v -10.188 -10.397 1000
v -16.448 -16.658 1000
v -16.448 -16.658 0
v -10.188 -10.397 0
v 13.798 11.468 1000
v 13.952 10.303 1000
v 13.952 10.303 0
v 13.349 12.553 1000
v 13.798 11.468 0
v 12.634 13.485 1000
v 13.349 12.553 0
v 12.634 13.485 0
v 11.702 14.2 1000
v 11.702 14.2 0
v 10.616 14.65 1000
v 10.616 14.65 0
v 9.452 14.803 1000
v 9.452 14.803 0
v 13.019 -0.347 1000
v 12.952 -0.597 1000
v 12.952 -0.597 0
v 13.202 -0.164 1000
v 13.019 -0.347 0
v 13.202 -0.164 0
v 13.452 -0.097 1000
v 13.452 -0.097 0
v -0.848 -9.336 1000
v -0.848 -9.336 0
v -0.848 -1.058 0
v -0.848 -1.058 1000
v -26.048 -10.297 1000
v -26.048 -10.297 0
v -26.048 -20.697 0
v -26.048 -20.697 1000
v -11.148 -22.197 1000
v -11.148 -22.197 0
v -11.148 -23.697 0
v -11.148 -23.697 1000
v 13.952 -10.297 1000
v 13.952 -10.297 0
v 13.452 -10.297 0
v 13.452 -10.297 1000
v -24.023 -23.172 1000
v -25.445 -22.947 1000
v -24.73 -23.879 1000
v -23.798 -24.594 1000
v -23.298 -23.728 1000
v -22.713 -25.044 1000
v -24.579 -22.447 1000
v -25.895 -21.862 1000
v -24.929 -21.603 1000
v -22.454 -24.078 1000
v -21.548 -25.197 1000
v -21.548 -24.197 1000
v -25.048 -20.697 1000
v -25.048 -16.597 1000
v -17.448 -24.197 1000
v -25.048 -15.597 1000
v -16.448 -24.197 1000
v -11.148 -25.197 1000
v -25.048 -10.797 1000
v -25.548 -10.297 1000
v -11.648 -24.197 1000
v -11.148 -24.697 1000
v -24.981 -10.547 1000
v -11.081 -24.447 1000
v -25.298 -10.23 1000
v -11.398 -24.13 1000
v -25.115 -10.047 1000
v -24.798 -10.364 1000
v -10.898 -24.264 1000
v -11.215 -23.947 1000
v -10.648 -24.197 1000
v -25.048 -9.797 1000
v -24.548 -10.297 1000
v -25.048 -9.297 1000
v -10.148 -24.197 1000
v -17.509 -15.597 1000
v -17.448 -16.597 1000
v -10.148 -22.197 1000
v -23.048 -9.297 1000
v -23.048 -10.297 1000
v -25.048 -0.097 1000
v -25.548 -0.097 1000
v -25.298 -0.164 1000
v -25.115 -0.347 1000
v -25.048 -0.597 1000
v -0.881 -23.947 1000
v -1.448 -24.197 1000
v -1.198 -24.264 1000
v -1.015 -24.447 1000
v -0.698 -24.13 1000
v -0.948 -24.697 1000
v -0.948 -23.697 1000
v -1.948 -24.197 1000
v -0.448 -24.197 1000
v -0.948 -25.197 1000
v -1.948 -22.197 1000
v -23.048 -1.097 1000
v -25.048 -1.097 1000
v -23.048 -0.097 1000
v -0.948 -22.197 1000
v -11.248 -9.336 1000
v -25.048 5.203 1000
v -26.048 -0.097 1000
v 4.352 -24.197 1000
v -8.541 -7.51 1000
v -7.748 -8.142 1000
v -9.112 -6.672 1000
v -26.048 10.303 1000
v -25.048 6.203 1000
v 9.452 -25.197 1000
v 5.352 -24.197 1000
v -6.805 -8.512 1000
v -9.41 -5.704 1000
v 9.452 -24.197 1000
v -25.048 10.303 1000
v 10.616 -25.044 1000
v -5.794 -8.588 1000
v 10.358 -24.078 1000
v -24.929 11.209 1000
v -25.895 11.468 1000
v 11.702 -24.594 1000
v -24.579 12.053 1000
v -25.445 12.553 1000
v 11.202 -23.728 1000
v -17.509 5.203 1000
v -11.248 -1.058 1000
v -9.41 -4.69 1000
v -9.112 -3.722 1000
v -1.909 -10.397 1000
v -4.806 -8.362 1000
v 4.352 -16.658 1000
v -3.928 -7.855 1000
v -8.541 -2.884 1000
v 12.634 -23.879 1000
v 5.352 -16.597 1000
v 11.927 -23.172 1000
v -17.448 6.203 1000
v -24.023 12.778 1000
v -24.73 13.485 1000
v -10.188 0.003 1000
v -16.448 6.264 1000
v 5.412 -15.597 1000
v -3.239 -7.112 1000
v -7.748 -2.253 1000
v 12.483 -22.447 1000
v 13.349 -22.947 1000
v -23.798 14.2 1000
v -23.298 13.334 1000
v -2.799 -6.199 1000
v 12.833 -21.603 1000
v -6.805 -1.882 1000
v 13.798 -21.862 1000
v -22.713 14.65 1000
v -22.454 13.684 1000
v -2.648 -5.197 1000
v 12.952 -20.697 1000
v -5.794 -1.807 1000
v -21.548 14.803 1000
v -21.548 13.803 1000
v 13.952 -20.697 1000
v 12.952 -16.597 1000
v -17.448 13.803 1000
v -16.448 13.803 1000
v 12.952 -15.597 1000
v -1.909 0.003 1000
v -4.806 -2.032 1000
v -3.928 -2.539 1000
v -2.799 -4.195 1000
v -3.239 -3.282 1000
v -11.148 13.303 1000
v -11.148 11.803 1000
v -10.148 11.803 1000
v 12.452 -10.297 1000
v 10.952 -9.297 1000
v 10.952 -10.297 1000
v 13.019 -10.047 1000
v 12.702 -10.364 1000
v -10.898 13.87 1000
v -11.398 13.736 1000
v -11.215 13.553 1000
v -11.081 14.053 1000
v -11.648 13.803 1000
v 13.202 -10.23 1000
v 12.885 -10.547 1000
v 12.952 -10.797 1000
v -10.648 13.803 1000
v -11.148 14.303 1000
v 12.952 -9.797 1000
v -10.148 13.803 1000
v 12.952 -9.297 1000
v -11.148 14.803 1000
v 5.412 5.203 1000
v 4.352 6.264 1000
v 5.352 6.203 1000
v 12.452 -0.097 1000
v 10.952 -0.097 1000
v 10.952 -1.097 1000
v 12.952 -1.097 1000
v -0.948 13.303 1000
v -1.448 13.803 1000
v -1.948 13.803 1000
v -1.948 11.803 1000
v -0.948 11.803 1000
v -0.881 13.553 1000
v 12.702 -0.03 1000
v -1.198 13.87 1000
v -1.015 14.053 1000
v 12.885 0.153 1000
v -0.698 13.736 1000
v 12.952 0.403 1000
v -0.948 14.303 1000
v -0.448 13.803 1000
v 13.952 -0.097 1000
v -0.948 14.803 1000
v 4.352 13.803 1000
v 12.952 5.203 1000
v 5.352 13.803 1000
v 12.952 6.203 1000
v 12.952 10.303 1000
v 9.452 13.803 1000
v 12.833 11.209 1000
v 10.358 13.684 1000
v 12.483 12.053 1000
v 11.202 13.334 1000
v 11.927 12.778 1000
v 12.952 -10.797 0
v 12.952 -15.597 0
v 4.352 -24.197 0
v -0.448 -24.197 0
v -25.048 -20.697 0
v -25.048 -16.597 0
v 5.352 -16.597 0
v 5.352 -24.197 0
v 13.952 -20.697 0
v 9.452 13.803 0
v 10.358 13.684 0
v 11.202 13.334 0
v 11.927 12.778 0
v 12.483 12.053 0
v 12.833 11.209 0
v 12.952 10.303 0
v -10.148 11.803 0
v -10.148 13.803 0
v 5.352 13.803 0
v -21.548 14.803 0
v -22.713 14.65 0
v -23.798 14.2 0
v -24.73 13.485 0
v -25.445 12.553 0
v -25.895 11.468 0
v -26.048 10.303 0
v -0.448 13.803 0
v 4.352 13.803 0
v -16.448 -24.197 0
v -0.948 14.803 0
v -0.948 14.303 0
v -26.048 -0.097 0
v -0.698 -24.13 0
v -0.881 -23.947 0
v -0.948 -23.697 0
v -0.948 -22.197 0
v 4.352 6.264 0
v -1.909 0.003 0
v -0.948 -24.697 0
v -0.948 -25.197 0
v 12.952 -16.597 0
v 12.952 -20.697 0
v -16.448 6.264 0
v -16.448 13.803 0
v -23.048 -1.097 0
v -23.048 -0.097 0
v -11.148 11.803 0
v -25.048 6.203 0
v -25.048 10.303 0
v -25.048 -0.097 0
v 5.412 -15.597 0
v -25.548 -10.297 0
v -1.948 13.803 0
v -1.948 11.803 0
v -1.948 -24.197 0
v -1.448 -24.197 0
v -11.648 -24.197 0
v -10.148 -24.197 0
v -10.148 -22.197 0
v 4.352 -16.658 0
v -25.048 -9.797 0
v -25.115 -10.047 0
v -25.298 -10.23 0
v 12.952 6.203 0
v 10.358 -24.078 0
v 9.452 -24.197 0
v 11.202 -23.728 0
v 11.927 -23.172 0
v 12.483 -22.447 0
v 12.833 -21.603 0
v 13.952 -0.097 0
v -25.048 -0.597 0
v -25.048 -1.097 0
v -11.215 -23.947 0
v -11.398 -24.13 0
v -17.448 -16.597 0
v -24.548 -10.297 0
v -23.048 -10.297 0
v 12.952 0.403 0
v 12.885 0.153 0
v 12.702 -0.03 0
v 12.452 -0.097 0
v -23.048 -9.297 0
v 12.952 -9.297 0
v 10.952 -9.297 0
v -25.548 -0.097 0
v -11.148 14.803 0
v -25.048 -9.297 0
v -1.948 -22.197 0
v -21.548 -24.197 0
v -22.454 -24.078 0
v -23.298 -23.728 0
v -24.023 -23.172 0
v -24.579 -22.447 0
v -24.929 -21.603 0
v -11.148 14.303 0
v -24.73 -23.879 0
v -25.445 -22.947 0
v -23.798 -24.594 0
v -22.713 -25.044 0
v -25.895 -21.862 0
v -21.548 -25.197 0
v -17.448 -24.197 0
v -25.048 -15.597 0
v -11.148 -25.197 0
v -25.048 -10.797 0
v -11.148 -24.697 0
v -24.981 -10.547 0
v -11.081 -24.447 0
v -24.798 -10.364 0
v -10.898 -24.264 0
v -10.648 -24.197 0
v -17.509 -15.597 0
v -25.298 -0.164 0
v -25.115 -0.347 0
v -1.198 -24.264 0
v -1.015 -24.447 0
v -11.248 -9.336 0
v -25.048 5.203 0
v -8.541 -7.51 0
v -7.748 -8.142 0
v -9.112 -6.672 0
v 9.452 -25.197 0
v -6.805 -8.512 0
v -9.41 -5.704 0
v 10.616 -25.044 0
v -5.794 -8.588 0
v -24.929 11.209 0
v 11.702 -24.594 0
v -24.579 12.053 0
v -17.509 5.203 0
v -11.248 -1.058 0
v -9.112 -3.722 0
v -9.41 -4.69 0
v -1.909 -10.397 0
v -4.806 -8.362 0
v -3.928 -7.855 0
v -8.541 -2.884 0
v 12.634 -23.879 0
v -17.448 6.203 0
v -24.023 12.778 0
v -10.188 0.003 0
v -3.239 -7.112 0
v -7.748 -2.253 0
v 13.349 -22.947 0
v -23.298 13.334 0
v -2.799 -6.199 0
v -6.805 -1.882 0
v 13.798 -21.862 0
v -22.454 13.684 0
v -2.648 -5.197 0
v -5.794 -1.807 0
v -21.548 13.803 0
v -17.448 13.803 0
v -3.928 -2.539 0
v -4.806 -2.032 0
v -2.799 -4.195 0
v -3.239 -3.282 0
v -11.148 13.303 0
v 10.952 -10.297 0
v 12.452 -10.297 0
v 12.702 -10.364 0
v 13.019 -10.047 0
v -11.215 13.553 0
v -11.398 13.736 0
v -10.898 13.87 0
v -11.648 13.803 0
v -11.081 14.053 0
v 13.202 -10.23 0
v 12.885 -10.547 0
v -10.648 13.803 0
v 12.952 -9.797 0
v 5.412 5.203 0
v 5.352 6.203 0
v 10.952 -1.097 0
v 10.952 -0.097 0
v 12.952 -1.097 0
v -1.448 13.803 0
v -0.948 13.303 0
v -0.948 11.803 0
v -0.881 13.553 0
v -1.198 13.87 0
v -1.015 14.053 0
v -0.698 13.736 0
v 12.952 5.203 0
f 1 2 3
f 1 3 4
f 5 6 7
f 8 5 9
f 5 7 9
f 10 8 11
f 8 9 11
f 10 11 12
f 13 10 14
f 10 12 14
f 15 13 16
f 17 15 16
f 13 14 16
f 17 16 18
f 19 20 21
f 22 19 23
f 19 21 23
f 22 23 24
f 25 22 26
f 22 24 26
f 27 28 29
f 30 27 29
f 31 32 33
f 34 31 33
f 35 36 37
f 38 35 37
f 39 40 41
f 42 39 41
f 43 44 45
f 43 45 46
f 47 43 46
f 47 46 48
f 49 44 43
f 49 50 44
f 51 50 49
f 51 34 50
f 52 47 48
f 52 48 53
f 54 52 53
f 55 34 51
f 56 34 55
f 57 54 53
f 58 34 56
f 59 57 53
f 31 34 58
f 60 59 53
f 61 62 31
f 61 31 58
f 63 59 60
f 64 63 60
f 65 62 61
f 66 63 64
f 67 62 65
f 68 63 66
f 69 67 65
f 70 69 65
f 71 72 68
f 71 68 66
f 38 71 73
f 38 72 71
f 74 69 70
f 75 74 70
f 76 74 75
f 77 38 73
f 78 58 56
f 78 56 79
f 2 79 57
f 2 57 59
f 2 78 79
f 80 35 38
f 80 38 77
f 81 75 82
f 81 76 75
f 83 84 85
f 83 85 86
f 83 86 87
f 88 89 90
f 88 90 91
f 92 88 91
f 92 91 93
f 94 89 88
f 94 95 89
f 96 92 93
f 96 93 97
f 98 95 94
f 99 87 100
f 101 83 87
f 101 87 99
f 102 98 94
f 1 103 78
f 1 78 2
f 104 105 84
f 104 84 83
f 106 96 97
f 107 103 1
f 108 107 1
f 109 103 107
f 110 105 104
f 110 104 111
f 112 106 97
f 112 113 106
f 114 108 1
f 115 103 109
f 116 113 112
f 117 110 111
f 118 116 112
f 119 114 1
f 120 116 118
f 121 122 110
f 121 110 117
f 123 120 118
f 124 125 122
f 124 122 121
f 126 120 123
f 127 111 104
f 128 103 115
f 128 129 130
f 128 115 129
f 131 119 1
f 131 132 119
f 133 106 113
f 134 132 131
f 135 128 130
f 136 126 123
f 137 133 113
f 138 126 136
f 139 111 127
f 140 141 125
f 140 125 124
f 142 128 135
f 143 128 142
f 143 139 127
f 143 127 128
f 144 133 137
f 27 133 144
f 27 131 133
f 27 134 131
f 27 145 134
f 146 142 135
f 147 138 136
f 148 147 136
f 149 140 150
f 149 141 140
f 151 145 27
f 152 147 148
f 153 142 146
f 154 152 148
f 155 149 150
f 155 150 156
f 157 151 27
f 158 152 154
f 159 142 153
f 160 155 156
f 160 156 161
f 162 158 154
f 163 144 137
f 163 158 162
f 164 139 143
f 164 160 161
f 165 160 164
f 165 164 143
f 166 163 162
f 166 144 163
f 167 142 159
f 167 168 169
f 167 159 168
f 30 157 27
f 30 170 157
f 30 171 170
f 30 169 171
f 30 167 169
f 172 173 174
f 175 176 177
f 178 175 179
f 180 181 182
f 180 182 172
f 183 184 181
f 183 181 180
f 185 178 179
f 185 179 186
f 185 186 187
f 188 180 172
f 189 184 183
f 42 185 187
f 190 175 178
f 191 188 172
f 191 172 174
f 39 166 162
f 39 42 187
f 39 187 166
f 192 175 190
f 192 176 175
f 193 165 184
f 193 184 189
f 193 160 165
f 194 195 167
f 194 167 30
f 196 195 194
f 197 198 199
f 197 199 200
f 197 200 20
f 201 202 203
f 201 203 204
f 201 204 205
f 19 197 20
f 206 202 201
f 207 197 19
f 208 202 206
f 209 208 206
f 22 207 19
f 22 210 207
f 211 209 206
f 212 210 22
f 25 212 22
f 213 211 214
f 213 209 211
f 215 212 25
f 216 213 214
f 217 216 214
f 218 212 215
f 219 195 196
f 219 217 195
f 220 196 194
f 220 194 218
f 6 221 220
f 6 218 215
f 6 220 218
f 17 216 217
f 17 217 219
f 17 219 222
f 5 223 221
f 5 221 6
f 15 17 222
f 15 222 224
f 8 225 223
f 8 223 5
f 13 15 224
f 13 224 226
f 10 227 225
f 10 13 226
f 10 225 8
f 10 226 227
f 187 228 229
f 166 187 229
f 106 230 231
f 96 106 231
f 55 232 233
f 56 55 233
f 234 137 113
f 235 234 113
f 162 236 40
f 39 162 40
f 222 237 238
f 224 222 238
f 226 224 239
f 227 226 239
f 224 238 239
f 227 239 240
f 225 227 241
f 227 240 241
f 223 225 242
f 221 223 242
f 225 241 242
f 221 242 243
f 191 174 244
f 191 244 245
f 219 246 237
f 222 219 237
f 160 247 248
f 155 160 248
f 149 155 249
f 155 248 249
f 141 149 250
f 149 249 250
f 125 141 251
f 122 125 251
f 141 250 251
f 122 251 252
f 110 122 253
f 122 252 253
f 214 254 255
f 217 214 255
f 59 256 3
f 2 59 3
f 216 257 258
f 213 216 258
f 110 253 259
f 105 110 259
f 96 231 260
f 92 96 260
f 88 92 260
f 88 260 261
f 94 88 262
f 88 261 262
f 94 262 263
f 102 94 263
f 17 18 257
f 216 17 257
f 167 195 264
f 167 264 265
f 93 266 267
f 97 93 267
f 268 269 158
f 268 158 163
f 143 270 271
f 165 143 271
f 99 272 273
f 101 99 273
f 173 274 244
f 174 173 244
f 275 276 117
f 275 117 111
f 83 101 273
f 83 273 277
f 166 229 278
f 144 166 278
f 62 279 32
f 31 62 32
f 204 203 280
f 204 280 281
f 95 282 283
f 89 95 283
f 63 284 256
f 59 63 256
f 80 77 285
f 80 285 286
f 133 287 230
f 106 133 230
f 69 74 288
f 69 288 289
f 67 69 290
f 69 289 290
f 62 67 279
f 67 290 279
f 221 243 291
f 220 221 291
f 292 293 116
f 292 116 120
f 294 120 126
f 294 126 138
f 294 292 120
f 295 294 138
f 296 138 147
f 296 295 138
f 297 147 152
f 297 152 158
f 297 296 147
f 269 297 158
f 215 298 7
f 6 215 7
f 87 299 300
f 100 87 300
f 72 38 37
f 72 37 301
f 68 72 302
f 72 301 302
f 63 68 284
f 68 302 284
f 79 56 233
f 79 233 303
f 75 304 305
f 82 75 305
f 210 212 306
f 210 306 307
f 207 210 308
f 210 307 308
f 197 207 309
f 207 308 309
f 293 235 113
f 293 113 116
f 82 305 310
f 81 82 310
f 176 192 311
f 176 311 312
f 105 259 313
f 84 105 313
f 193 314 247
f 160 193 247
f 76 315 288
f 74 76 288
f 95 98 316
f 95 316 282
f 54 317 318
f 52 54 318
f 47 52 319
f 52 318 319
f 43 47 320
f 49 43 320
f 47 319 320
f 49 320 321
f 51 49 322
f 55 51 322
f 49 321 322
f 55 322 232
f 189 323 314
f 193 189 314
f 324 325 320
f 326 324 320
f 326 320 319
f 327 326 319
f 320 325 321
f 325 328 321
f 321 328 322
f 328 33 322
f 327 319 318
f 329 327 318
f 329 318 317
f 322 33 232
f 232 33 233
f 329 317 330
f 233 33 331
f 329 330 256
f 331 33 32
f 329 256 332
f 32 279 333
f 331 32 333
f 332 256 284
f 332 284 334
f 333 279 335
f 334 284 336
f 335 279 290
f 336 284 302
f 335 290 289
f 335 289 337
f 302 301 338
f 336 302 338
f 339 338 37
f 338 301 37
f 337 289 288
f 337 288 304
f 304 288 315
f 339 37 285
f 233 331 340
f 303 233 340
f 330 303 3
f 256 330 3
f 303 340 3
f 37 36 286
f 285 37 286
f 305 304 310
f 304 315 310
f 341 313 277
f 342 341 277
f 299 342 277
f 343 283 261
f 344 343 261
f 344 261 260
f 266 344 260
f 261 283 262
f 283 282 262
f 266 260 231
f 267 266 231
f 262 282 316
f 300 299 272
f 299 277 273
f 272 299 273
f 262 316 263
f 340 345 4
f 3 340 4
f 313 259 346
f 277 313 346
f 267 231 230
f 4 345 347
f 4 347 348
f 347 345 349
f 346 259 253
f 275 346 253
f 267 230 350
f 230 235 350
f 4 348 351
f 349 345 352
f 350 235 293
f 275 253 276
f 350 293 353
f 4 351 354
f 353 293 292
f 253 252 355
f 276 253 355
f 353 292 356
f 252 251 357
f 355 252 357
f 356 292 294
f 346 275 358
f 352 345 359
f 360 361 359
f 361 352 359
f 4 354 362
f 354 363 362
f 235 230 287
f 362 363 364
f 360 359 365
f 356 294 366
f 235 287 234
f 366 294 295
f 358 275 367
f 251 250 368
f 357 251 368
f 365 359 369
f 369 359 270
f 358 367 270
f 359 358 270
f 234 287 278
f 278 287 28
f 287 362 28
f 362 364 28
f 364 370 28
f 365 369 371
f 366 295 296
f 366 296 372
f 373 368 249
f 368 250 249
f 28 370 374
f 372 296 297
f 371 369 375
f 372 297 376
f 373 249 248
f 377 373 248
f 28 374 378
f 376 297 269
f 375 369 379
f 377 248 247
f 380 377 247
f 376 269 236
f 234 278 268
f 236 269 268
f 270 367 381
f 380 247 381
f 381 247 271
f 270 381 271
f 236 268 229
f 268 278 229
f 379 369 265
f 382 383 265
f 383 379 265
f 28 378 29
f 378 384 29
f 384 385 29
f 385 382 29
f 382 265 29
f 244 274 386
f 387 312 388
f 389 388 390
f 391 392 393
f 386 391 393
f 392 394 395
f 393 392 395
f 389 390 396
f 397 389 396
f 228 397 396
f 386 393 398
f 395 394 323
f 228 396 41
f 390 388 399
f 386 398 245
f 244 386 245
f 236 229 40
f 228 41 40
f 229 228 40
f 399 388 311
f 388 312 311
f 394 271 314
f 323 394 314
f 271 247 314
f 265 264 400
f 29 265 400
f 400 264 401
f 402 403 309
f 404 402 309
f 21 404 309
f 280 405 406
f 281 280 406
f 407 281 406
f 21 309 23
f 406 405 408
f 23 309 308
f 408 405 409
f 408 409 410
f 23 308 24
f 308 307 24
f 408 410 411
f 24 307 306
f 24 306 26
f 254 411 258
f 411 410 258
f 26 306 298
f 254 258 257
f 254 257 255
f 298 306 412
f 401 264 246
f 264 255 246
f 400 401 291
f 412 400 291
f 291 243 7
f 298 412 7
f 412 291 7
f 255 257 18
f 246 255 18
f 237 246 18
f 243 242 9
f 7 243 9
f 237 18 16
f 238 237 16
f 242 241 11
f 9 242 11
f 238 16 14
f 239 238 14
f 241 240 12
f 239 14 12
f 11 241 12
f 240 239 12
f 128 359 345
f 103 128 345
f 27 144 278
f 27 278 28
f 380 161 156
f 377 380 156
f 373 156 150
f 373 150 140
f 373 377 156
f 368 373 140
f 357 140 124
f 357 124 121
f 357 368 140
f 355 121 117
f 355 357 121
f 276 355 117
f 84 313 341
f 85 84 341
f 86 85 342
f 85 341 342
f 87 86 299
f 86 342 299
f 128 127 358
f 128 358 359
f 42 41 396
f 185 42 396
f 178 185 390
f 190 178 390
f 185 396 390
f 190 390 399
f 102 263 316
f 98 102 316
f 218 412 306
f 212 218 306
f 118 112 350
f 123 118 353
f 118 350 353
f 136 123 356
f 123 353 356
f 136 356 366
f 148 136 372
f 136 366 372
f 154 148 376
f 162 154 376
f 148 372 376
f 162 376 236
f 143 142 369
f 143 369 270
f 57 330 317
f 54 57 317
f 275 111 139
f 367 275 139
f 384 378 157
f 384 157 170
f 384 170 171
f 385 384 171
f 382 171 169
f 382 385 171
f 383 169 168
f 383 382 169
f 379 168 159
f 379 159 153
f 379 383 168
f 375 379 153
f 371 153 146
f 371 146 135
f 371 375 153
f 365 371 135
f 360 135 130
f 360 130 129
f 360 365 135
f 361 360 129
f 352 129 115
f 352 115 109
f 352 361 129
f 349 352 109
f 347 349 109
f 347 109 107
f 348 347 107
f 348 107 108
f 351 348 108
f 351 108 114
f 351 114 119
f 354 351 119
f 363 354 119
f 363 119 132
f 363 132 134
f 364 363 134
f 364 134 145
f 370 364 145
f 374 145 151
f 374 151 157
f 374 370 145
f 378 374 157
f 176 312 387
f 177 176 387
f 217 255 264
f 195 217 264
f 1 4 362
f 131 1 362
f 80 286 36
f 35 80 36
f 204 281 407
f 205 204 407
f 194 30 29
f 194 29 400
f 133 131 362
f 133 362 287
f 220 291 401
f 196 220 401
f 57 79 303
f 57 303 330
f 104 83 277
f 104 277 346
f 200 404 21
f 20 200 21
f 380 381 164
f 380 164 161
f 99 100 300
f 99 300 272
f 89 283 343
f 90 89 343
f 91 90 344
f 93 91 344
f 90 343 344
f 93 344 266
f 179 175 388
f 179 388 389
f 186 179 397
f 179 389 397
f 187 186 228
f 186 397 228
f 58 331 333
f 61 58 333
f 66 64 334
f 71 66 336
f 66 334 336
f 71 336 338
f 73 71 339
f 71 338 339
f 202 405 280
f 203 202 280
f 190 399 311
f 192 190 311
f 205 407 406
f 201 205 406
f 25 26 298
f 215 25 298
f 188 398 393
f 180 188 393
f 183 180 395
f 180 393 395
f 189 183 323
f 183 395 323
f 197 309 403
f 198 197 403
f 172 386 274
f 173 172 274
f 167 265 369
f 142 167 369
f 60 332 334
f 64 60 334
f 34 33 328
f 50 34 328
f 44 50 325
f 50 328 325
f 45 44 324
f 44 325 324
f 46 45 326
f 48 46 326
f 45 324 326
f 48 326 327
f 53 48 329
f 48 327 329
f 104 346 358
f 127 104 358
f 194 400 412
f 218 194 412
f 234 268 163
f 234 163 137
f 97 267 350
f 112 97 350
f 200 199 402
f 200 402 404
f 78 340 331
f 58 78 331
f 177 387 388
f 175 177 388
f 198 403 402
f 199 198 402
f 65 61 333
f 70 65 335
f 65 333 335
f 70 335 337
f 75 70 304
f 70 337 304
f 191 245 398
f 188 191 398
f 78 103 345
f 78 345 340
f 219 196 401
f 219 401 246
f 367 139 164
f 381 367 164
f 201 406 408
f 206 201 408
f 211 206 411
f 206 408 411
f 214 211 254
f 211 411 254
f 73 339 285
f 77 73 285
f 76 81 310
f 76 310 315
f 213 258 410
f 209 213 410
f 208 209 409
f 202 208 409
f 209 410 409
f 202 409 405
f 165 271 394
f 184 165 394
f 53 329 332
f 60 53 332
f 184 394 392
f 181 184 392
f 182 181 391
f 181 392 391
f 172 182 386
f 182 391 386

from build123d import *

# Parameters (mm, degrees)
SKETCH_1_R      = 3.4
EXTRUDE_1_DEPTH = 1000


with BuildPart() as part:
    # 草图1 → 凸台-拉伸1 (new body)
    with BuildSketch(Plane.XY):
        with BuildLine():
            Line((-11.148233949, 14.802957359), (-21.548233949, 14.802957359))
            ThreePointArc((-21.548233949, 14.802957359), (-24.730214465, 13.484937874), (-26.048233949, 10.302957359))
            Line((-26.048233949, 10.302957359), (-26.048233949, -0.097042641))
            Line((-26.048233949, -0.097042641), (-25.548233949, -0.097042641))
            ThreePointArc((-25.548233949, -0.097042641), (-25.194680559, -0.24348925), (-25.048233949, -0.597042641))
            Line((-25.048233949, -0.597042641), (-25.048233949, -1.097042641))
            Line((-25.048233949, -1.097042641), (-23.048233949, -1.097042641))
            Line((-23.048233949, -1.097042641), (-23.048233949, -0.097042641))
            Line((-23.048233949, -0.097042641), (-25.048233949, -0.097042641))
            Line((-25.048233949, -0.097042641), (-25.048233949, 5.202957359))
            Line((-25.048233949, 5.202957359), (-17.508894121, 5.202957359))
            Line((-17.508894121, 5.202957359), (-11.248233949, -1.057702813))
            Line((-11.248233949, -1.057702813), (-11.248233949, -9.336382469))
            Line((-11.248233949, -9.336382469), (-17.508894121, -15.597042641))
            Line((-17.508894121, -15.597042641), (-25.048233949, -15.597042641))
            Line((-25.048233949, -15.597042641), (-25.048233949, -10.797042641))
            ThreePointArc((-25.048233949, -10.797042641), (-24.90178734, -10.44348925), (-24.548233949, -10.297042641))
            Line((-24.548233949, -10.297042641), (-23.048233949, -10.297042641))
            Line((-23.048233949, -10.297042641), (-23.048233949, -9.297042641))
            Line((-23.048233949, -9.297042641), (-25.048233949, -9.297042641))
            Line((-25.048233949, -9.297042641), (-25.048233949, -9.797042641))
            ThreePointArc((-25.048233949, -9.797042641), (-25.194680559, -10.150596032), (-25.548233949, -10.297042641))
            Line((-25.548233949, -10.297042641), (-26.048233949, -10.297042641))
            Line((-26.048233949, -10.297042641), (-26.048233949, -20.697042641))
            ThreePointArc((-26.048233949, -20.697042641), (-24.730214465, -23.879023156), (-21.548233949, -25.197042641))
            Line((-21.548233949, -25.197042641), (-11.148233949, -25.197042641))
            Line((-11.148233949, -25.197042641), (-11.148233949, -24.697042641))
            ThreePointArc((-11.148233949, -24.697042641), (-11.00178734, -24.34348925), (-10.648233949, -24.197042641))
            Line((-10.648233949, -24.197042641), (-10.148233949, -24.197042641))
            Line((-10.148233949, -24.197042641), (-10.148233949, -22.197042641))
            Line((-10.148233949, -22.197042641), (-11.148233949, -22.197042641))
            Line((-11.148233949, -22.197042641), (-11.148233949, -23.697042641))
            ThreePointArc((-11.148233949, -23.697042641), (-11.294680559, -24.050596032), (-11.648233949, -24.197042641))
            Line((-11.648233949, -24.197042641), (-16.448233949, -24.197042641))
            Line((-16.448233949, -24.197042641), (-16.448233949, -16.657702813))
            Line((-16.448233949, -16.657702813), (-10.187573777, -10.397042641))
            Line((-10.187573777, -10.397042641), (-1.908894121, -10.397042641))
            Line((-1.908894121, -10.397042641), (4.351766051, -16.657702813))
            Line((4.351766051, -16.657702813), (4.351766051, -24.197042641))
            Line((4.351766051, -24.197042641), (-0.448233949, -24.197042641))
            ThreePointArc((-0.448233949, -24.197042641), (-0.80178734, -24.050596032), (-0.948233949, -23.697042641))
            Line((-0.948233949, -23.697042641), (-0.948233949, -22.197042641))
            Line((-0.948233949, -22.197042641), (-1.948233949, -22.197042641))
            Line((-1.948233949, -22.197042641), (-1.948233949, -24.197042641))
            Line((-1.948233949, -24.197042641), (-1.448233949, -24.197042641))
            ThreePointArc((-1.448233949, -24.197042641), (-1.094680559, -24.34348925), (-0.948233949, -24.697042641))
            Line((-0.948233949, -24.697042641), (-0.948233949, -25.197042641))
            Line((-0.948233949, -25.197042641), (9.451766051, -25.197042641))
            ThreePointArc((9.451766051, -25.197042641), (12.633746566, -23.879023156), (13.951766051, -20.697042641))
            Line((13.951766051, -20.697042641), (13.951766051, -10.297042641))
            Line((13.951766051, -10.297042641), (13.451766051, -10.297042641))
            ThreePointArc((13.451766051, -10.297042641), (13.09821266, -10.150596032), (12.951766051, -9.797042641))
            Line((12.951766051, -9.797042641), (12.951766051, -9.297042641))
            Line((12.951766051, -9.297042641), (10.951766051, -9.297042641))
            Line((10.951766051, -9.297042641), (10.951766051, -10.297042641))
            Line((10.951766051, -10.297042641), (12.451766051, -10.297042641))
            ThreePointArc((12.451766051, -10.297042641), (12.805319441, -10.44348925), (12.951766051, -10.797042641))
            Line((12.951766051, -10.797042641), (12.951766051, -15.597042641))
            Line((12.951766051, -15.597042641), (5.412426223, -15.597042641))
            Line((5.412426223, -15.597042641), (-0.848233949, -9.336382469))
            Line((-0.848233949, -9.336382469), (-0.848233949, -1.057702813))
            Line((-0.848233949, -1.057702813), (5.412426223, 5.202957359))
            Line((5.412426223, 5.202957359), (12.951766051, 5.202957359))
            Line((12.951766051, 5.202957359), (12.951766051, 0.402957359))
            ThreePointArc((12.951766051, 0.402957359), (12.805319441, 0.049403968), (12.451766051, -0.097042641))
            Line((12.451766051, -0.097042641), (10.951766051, -0.097042641))
            Line((10.951766051, -0.097042641), (10.951766051, -1.097042641))
            Line((10.951766051, -1.097042641), (12.951766051, -1.097042641))
            Line((12.951766051, -1.097042641), (12.951766051, -0.597042641))
            ThreePointArc((12.951766051, -0.597042641), (13.09821266, -0.24348925), (13.451766051, -0.097042641))
            Line((13.451766051, -0.097042641), (13.951766051, -0.097042641))
            Line((13.951766051, -0.097042641), (13.951766051, 10.302957359))
            ThreePointArc((13.951766051, 10.302957359), (12.633746566, 13.484937874), (9.451766051, 14.802957359))
            Line((9.451766051, 14.802957359), (-0.948233949, 14.802957359))
            Line((-0.948233949, 14.802957359), (-0.948233949, 14.302957359))
            ThreePointArc((-0.948233949, 14.302957359), (-1.094680559, 13.949403968), (-1.448233949, 13.802957359))
            Line((-1.448233949, 13.802957359), (-1.948233949, 13.802957359))
            Line((-1.948233949, 13.802957359), (-1.948233949, 11.802957359))
            Line((-1.948233949, 11.802957359), (-0.948233949, 11.802957359))
            Line((-0.948233949, 11.802957359), (-0.948233949, 13.302957359))
            ThreePointArc((-0.948233949, 13.302957359), (-0.80178734, 13.65651075), (-0.448233949, 13.802957359))
            Line((-0.448233949, 13.802957359), (4.351766051, 13.802957359))
            Line((4.351766051, 13.802957359), (4.351766051, 6.263617531))
            Line((4.351766051, 6.263617531), (-1.908894121, 0.002957359))
            Line((-1.908894121, 0.002957359), (-10.187573777, 0.002957359))
            Line((-10.187573777, 0.002957359), (-16.448233949, 6.263617531))
            Line((-16.448233949, 6.263617531), (-16.448233949, 13.802957359))
            Line((-16.448233949, 13.802957359), (-11.648233949, 13.802957359))
            ThreePointArc((-11.648233949, 13.802957359), (-11.294680559, 13.65651075), (-11.148233949, 13.302957359))
            Line((-11.148233949, 13.302957359), (-11.148233949, 11.802957359))
            Line((-11.148233949, 11.802957359), (-10.148233949, 11.802957359))
            Line((-10.148233949, 11.802957359), (-10.148233949, 13.802957359))
            Line((-10.148233949, 13.802957359), (-10.648233949, 13.802957359))
            ThreePointArc((-10.648233949, 13.802957359), (-11.00178734, 13.949403968), (-11.148233949, 14.302957359))
            Line((-11.148233949, 14.302957359), (-11.148233949, 14.802957359))
        make_face()
        with Locations((-6.048233949, -5.197042641)):
            Circle(SKETCH_1_R, mode=Mode.SUBTRACT)
        with BuildLine():
            Line((-17.448233949, 13.802957359), (-21.548233949, 13.802957359))
            ThreePointArc((-21.548233949, 13.802957359), (-24.023107683, 12.777831093), (-25.048233949, 10.302957359))
            Line((-25.048233949, 10.302957359), (-25.048233949, 6.202957359))
            Line((-25.048233949, 6.202957359), (-17.448233949, 6.202957359))
            Line((-17.448233949, 6.202957359), (-17.448233949, 13.802957359))
        make_face(mode=Mode.SUBTRACT)
        with BuildLine():
            Line((5.351766051, 13.802957359), (9.451766051, 13.802957359))
            ThreePointArc((9.451766051, 13.802957359), (11.926639785, 12.777831093), (12.951766051, 10.302957359))
            Line((12.951766051, 10.302957359), (12.951766051, 6.202957359))
            Line((12.951766051, 6.202957359), (5.351766051, 6.202957359))
            Line((5.351766051, 6.202957359), (5.351766051, 13.802957359))
        make_face(mode=Mode.SUBTRACT)
        with BuildLine():
            Line((-17.448233949, -24.197042641), (-21.548233949, -24.197042641))
            ThreePointArc((-21.548233949, -24.197042641), (-24.023107683, -23.171916375), (-25.048233949, -20.697042641))
            Line((-25.048233949, -20.697042641), (-25.048233949, -16.597042641))
            Line((-25.048233949, -16.597042641), (-17.448233949, -16.597042641))
            Line((-17.448233949, -16.597042641), (-17.448233949, -24.197042641))
        make_face(mode=Mode.SUBTRACT)
        with BuildLine():
            Line((5.351766051, -24.197042641), (9.451766051, -24.197042641))
            ThreePointArc((9.451766051, -24.197042641), (11.926639785, -23.171916375), (12.951766051, -20.697042641))
            Line((12.951766051, -20.697042641), (12.951766051, -16.597042641))
            Line((12.951766051, -16.597042641), (5.351766051, -16.597042641))
            Line((5.351766051, -16.597042641), (5.351766051, -24.197042641))
        make_face(mode=Mode.SUBTRACT)
    extrude(amount=EXTRUDE_1_DEPTH)


solid = part.part
